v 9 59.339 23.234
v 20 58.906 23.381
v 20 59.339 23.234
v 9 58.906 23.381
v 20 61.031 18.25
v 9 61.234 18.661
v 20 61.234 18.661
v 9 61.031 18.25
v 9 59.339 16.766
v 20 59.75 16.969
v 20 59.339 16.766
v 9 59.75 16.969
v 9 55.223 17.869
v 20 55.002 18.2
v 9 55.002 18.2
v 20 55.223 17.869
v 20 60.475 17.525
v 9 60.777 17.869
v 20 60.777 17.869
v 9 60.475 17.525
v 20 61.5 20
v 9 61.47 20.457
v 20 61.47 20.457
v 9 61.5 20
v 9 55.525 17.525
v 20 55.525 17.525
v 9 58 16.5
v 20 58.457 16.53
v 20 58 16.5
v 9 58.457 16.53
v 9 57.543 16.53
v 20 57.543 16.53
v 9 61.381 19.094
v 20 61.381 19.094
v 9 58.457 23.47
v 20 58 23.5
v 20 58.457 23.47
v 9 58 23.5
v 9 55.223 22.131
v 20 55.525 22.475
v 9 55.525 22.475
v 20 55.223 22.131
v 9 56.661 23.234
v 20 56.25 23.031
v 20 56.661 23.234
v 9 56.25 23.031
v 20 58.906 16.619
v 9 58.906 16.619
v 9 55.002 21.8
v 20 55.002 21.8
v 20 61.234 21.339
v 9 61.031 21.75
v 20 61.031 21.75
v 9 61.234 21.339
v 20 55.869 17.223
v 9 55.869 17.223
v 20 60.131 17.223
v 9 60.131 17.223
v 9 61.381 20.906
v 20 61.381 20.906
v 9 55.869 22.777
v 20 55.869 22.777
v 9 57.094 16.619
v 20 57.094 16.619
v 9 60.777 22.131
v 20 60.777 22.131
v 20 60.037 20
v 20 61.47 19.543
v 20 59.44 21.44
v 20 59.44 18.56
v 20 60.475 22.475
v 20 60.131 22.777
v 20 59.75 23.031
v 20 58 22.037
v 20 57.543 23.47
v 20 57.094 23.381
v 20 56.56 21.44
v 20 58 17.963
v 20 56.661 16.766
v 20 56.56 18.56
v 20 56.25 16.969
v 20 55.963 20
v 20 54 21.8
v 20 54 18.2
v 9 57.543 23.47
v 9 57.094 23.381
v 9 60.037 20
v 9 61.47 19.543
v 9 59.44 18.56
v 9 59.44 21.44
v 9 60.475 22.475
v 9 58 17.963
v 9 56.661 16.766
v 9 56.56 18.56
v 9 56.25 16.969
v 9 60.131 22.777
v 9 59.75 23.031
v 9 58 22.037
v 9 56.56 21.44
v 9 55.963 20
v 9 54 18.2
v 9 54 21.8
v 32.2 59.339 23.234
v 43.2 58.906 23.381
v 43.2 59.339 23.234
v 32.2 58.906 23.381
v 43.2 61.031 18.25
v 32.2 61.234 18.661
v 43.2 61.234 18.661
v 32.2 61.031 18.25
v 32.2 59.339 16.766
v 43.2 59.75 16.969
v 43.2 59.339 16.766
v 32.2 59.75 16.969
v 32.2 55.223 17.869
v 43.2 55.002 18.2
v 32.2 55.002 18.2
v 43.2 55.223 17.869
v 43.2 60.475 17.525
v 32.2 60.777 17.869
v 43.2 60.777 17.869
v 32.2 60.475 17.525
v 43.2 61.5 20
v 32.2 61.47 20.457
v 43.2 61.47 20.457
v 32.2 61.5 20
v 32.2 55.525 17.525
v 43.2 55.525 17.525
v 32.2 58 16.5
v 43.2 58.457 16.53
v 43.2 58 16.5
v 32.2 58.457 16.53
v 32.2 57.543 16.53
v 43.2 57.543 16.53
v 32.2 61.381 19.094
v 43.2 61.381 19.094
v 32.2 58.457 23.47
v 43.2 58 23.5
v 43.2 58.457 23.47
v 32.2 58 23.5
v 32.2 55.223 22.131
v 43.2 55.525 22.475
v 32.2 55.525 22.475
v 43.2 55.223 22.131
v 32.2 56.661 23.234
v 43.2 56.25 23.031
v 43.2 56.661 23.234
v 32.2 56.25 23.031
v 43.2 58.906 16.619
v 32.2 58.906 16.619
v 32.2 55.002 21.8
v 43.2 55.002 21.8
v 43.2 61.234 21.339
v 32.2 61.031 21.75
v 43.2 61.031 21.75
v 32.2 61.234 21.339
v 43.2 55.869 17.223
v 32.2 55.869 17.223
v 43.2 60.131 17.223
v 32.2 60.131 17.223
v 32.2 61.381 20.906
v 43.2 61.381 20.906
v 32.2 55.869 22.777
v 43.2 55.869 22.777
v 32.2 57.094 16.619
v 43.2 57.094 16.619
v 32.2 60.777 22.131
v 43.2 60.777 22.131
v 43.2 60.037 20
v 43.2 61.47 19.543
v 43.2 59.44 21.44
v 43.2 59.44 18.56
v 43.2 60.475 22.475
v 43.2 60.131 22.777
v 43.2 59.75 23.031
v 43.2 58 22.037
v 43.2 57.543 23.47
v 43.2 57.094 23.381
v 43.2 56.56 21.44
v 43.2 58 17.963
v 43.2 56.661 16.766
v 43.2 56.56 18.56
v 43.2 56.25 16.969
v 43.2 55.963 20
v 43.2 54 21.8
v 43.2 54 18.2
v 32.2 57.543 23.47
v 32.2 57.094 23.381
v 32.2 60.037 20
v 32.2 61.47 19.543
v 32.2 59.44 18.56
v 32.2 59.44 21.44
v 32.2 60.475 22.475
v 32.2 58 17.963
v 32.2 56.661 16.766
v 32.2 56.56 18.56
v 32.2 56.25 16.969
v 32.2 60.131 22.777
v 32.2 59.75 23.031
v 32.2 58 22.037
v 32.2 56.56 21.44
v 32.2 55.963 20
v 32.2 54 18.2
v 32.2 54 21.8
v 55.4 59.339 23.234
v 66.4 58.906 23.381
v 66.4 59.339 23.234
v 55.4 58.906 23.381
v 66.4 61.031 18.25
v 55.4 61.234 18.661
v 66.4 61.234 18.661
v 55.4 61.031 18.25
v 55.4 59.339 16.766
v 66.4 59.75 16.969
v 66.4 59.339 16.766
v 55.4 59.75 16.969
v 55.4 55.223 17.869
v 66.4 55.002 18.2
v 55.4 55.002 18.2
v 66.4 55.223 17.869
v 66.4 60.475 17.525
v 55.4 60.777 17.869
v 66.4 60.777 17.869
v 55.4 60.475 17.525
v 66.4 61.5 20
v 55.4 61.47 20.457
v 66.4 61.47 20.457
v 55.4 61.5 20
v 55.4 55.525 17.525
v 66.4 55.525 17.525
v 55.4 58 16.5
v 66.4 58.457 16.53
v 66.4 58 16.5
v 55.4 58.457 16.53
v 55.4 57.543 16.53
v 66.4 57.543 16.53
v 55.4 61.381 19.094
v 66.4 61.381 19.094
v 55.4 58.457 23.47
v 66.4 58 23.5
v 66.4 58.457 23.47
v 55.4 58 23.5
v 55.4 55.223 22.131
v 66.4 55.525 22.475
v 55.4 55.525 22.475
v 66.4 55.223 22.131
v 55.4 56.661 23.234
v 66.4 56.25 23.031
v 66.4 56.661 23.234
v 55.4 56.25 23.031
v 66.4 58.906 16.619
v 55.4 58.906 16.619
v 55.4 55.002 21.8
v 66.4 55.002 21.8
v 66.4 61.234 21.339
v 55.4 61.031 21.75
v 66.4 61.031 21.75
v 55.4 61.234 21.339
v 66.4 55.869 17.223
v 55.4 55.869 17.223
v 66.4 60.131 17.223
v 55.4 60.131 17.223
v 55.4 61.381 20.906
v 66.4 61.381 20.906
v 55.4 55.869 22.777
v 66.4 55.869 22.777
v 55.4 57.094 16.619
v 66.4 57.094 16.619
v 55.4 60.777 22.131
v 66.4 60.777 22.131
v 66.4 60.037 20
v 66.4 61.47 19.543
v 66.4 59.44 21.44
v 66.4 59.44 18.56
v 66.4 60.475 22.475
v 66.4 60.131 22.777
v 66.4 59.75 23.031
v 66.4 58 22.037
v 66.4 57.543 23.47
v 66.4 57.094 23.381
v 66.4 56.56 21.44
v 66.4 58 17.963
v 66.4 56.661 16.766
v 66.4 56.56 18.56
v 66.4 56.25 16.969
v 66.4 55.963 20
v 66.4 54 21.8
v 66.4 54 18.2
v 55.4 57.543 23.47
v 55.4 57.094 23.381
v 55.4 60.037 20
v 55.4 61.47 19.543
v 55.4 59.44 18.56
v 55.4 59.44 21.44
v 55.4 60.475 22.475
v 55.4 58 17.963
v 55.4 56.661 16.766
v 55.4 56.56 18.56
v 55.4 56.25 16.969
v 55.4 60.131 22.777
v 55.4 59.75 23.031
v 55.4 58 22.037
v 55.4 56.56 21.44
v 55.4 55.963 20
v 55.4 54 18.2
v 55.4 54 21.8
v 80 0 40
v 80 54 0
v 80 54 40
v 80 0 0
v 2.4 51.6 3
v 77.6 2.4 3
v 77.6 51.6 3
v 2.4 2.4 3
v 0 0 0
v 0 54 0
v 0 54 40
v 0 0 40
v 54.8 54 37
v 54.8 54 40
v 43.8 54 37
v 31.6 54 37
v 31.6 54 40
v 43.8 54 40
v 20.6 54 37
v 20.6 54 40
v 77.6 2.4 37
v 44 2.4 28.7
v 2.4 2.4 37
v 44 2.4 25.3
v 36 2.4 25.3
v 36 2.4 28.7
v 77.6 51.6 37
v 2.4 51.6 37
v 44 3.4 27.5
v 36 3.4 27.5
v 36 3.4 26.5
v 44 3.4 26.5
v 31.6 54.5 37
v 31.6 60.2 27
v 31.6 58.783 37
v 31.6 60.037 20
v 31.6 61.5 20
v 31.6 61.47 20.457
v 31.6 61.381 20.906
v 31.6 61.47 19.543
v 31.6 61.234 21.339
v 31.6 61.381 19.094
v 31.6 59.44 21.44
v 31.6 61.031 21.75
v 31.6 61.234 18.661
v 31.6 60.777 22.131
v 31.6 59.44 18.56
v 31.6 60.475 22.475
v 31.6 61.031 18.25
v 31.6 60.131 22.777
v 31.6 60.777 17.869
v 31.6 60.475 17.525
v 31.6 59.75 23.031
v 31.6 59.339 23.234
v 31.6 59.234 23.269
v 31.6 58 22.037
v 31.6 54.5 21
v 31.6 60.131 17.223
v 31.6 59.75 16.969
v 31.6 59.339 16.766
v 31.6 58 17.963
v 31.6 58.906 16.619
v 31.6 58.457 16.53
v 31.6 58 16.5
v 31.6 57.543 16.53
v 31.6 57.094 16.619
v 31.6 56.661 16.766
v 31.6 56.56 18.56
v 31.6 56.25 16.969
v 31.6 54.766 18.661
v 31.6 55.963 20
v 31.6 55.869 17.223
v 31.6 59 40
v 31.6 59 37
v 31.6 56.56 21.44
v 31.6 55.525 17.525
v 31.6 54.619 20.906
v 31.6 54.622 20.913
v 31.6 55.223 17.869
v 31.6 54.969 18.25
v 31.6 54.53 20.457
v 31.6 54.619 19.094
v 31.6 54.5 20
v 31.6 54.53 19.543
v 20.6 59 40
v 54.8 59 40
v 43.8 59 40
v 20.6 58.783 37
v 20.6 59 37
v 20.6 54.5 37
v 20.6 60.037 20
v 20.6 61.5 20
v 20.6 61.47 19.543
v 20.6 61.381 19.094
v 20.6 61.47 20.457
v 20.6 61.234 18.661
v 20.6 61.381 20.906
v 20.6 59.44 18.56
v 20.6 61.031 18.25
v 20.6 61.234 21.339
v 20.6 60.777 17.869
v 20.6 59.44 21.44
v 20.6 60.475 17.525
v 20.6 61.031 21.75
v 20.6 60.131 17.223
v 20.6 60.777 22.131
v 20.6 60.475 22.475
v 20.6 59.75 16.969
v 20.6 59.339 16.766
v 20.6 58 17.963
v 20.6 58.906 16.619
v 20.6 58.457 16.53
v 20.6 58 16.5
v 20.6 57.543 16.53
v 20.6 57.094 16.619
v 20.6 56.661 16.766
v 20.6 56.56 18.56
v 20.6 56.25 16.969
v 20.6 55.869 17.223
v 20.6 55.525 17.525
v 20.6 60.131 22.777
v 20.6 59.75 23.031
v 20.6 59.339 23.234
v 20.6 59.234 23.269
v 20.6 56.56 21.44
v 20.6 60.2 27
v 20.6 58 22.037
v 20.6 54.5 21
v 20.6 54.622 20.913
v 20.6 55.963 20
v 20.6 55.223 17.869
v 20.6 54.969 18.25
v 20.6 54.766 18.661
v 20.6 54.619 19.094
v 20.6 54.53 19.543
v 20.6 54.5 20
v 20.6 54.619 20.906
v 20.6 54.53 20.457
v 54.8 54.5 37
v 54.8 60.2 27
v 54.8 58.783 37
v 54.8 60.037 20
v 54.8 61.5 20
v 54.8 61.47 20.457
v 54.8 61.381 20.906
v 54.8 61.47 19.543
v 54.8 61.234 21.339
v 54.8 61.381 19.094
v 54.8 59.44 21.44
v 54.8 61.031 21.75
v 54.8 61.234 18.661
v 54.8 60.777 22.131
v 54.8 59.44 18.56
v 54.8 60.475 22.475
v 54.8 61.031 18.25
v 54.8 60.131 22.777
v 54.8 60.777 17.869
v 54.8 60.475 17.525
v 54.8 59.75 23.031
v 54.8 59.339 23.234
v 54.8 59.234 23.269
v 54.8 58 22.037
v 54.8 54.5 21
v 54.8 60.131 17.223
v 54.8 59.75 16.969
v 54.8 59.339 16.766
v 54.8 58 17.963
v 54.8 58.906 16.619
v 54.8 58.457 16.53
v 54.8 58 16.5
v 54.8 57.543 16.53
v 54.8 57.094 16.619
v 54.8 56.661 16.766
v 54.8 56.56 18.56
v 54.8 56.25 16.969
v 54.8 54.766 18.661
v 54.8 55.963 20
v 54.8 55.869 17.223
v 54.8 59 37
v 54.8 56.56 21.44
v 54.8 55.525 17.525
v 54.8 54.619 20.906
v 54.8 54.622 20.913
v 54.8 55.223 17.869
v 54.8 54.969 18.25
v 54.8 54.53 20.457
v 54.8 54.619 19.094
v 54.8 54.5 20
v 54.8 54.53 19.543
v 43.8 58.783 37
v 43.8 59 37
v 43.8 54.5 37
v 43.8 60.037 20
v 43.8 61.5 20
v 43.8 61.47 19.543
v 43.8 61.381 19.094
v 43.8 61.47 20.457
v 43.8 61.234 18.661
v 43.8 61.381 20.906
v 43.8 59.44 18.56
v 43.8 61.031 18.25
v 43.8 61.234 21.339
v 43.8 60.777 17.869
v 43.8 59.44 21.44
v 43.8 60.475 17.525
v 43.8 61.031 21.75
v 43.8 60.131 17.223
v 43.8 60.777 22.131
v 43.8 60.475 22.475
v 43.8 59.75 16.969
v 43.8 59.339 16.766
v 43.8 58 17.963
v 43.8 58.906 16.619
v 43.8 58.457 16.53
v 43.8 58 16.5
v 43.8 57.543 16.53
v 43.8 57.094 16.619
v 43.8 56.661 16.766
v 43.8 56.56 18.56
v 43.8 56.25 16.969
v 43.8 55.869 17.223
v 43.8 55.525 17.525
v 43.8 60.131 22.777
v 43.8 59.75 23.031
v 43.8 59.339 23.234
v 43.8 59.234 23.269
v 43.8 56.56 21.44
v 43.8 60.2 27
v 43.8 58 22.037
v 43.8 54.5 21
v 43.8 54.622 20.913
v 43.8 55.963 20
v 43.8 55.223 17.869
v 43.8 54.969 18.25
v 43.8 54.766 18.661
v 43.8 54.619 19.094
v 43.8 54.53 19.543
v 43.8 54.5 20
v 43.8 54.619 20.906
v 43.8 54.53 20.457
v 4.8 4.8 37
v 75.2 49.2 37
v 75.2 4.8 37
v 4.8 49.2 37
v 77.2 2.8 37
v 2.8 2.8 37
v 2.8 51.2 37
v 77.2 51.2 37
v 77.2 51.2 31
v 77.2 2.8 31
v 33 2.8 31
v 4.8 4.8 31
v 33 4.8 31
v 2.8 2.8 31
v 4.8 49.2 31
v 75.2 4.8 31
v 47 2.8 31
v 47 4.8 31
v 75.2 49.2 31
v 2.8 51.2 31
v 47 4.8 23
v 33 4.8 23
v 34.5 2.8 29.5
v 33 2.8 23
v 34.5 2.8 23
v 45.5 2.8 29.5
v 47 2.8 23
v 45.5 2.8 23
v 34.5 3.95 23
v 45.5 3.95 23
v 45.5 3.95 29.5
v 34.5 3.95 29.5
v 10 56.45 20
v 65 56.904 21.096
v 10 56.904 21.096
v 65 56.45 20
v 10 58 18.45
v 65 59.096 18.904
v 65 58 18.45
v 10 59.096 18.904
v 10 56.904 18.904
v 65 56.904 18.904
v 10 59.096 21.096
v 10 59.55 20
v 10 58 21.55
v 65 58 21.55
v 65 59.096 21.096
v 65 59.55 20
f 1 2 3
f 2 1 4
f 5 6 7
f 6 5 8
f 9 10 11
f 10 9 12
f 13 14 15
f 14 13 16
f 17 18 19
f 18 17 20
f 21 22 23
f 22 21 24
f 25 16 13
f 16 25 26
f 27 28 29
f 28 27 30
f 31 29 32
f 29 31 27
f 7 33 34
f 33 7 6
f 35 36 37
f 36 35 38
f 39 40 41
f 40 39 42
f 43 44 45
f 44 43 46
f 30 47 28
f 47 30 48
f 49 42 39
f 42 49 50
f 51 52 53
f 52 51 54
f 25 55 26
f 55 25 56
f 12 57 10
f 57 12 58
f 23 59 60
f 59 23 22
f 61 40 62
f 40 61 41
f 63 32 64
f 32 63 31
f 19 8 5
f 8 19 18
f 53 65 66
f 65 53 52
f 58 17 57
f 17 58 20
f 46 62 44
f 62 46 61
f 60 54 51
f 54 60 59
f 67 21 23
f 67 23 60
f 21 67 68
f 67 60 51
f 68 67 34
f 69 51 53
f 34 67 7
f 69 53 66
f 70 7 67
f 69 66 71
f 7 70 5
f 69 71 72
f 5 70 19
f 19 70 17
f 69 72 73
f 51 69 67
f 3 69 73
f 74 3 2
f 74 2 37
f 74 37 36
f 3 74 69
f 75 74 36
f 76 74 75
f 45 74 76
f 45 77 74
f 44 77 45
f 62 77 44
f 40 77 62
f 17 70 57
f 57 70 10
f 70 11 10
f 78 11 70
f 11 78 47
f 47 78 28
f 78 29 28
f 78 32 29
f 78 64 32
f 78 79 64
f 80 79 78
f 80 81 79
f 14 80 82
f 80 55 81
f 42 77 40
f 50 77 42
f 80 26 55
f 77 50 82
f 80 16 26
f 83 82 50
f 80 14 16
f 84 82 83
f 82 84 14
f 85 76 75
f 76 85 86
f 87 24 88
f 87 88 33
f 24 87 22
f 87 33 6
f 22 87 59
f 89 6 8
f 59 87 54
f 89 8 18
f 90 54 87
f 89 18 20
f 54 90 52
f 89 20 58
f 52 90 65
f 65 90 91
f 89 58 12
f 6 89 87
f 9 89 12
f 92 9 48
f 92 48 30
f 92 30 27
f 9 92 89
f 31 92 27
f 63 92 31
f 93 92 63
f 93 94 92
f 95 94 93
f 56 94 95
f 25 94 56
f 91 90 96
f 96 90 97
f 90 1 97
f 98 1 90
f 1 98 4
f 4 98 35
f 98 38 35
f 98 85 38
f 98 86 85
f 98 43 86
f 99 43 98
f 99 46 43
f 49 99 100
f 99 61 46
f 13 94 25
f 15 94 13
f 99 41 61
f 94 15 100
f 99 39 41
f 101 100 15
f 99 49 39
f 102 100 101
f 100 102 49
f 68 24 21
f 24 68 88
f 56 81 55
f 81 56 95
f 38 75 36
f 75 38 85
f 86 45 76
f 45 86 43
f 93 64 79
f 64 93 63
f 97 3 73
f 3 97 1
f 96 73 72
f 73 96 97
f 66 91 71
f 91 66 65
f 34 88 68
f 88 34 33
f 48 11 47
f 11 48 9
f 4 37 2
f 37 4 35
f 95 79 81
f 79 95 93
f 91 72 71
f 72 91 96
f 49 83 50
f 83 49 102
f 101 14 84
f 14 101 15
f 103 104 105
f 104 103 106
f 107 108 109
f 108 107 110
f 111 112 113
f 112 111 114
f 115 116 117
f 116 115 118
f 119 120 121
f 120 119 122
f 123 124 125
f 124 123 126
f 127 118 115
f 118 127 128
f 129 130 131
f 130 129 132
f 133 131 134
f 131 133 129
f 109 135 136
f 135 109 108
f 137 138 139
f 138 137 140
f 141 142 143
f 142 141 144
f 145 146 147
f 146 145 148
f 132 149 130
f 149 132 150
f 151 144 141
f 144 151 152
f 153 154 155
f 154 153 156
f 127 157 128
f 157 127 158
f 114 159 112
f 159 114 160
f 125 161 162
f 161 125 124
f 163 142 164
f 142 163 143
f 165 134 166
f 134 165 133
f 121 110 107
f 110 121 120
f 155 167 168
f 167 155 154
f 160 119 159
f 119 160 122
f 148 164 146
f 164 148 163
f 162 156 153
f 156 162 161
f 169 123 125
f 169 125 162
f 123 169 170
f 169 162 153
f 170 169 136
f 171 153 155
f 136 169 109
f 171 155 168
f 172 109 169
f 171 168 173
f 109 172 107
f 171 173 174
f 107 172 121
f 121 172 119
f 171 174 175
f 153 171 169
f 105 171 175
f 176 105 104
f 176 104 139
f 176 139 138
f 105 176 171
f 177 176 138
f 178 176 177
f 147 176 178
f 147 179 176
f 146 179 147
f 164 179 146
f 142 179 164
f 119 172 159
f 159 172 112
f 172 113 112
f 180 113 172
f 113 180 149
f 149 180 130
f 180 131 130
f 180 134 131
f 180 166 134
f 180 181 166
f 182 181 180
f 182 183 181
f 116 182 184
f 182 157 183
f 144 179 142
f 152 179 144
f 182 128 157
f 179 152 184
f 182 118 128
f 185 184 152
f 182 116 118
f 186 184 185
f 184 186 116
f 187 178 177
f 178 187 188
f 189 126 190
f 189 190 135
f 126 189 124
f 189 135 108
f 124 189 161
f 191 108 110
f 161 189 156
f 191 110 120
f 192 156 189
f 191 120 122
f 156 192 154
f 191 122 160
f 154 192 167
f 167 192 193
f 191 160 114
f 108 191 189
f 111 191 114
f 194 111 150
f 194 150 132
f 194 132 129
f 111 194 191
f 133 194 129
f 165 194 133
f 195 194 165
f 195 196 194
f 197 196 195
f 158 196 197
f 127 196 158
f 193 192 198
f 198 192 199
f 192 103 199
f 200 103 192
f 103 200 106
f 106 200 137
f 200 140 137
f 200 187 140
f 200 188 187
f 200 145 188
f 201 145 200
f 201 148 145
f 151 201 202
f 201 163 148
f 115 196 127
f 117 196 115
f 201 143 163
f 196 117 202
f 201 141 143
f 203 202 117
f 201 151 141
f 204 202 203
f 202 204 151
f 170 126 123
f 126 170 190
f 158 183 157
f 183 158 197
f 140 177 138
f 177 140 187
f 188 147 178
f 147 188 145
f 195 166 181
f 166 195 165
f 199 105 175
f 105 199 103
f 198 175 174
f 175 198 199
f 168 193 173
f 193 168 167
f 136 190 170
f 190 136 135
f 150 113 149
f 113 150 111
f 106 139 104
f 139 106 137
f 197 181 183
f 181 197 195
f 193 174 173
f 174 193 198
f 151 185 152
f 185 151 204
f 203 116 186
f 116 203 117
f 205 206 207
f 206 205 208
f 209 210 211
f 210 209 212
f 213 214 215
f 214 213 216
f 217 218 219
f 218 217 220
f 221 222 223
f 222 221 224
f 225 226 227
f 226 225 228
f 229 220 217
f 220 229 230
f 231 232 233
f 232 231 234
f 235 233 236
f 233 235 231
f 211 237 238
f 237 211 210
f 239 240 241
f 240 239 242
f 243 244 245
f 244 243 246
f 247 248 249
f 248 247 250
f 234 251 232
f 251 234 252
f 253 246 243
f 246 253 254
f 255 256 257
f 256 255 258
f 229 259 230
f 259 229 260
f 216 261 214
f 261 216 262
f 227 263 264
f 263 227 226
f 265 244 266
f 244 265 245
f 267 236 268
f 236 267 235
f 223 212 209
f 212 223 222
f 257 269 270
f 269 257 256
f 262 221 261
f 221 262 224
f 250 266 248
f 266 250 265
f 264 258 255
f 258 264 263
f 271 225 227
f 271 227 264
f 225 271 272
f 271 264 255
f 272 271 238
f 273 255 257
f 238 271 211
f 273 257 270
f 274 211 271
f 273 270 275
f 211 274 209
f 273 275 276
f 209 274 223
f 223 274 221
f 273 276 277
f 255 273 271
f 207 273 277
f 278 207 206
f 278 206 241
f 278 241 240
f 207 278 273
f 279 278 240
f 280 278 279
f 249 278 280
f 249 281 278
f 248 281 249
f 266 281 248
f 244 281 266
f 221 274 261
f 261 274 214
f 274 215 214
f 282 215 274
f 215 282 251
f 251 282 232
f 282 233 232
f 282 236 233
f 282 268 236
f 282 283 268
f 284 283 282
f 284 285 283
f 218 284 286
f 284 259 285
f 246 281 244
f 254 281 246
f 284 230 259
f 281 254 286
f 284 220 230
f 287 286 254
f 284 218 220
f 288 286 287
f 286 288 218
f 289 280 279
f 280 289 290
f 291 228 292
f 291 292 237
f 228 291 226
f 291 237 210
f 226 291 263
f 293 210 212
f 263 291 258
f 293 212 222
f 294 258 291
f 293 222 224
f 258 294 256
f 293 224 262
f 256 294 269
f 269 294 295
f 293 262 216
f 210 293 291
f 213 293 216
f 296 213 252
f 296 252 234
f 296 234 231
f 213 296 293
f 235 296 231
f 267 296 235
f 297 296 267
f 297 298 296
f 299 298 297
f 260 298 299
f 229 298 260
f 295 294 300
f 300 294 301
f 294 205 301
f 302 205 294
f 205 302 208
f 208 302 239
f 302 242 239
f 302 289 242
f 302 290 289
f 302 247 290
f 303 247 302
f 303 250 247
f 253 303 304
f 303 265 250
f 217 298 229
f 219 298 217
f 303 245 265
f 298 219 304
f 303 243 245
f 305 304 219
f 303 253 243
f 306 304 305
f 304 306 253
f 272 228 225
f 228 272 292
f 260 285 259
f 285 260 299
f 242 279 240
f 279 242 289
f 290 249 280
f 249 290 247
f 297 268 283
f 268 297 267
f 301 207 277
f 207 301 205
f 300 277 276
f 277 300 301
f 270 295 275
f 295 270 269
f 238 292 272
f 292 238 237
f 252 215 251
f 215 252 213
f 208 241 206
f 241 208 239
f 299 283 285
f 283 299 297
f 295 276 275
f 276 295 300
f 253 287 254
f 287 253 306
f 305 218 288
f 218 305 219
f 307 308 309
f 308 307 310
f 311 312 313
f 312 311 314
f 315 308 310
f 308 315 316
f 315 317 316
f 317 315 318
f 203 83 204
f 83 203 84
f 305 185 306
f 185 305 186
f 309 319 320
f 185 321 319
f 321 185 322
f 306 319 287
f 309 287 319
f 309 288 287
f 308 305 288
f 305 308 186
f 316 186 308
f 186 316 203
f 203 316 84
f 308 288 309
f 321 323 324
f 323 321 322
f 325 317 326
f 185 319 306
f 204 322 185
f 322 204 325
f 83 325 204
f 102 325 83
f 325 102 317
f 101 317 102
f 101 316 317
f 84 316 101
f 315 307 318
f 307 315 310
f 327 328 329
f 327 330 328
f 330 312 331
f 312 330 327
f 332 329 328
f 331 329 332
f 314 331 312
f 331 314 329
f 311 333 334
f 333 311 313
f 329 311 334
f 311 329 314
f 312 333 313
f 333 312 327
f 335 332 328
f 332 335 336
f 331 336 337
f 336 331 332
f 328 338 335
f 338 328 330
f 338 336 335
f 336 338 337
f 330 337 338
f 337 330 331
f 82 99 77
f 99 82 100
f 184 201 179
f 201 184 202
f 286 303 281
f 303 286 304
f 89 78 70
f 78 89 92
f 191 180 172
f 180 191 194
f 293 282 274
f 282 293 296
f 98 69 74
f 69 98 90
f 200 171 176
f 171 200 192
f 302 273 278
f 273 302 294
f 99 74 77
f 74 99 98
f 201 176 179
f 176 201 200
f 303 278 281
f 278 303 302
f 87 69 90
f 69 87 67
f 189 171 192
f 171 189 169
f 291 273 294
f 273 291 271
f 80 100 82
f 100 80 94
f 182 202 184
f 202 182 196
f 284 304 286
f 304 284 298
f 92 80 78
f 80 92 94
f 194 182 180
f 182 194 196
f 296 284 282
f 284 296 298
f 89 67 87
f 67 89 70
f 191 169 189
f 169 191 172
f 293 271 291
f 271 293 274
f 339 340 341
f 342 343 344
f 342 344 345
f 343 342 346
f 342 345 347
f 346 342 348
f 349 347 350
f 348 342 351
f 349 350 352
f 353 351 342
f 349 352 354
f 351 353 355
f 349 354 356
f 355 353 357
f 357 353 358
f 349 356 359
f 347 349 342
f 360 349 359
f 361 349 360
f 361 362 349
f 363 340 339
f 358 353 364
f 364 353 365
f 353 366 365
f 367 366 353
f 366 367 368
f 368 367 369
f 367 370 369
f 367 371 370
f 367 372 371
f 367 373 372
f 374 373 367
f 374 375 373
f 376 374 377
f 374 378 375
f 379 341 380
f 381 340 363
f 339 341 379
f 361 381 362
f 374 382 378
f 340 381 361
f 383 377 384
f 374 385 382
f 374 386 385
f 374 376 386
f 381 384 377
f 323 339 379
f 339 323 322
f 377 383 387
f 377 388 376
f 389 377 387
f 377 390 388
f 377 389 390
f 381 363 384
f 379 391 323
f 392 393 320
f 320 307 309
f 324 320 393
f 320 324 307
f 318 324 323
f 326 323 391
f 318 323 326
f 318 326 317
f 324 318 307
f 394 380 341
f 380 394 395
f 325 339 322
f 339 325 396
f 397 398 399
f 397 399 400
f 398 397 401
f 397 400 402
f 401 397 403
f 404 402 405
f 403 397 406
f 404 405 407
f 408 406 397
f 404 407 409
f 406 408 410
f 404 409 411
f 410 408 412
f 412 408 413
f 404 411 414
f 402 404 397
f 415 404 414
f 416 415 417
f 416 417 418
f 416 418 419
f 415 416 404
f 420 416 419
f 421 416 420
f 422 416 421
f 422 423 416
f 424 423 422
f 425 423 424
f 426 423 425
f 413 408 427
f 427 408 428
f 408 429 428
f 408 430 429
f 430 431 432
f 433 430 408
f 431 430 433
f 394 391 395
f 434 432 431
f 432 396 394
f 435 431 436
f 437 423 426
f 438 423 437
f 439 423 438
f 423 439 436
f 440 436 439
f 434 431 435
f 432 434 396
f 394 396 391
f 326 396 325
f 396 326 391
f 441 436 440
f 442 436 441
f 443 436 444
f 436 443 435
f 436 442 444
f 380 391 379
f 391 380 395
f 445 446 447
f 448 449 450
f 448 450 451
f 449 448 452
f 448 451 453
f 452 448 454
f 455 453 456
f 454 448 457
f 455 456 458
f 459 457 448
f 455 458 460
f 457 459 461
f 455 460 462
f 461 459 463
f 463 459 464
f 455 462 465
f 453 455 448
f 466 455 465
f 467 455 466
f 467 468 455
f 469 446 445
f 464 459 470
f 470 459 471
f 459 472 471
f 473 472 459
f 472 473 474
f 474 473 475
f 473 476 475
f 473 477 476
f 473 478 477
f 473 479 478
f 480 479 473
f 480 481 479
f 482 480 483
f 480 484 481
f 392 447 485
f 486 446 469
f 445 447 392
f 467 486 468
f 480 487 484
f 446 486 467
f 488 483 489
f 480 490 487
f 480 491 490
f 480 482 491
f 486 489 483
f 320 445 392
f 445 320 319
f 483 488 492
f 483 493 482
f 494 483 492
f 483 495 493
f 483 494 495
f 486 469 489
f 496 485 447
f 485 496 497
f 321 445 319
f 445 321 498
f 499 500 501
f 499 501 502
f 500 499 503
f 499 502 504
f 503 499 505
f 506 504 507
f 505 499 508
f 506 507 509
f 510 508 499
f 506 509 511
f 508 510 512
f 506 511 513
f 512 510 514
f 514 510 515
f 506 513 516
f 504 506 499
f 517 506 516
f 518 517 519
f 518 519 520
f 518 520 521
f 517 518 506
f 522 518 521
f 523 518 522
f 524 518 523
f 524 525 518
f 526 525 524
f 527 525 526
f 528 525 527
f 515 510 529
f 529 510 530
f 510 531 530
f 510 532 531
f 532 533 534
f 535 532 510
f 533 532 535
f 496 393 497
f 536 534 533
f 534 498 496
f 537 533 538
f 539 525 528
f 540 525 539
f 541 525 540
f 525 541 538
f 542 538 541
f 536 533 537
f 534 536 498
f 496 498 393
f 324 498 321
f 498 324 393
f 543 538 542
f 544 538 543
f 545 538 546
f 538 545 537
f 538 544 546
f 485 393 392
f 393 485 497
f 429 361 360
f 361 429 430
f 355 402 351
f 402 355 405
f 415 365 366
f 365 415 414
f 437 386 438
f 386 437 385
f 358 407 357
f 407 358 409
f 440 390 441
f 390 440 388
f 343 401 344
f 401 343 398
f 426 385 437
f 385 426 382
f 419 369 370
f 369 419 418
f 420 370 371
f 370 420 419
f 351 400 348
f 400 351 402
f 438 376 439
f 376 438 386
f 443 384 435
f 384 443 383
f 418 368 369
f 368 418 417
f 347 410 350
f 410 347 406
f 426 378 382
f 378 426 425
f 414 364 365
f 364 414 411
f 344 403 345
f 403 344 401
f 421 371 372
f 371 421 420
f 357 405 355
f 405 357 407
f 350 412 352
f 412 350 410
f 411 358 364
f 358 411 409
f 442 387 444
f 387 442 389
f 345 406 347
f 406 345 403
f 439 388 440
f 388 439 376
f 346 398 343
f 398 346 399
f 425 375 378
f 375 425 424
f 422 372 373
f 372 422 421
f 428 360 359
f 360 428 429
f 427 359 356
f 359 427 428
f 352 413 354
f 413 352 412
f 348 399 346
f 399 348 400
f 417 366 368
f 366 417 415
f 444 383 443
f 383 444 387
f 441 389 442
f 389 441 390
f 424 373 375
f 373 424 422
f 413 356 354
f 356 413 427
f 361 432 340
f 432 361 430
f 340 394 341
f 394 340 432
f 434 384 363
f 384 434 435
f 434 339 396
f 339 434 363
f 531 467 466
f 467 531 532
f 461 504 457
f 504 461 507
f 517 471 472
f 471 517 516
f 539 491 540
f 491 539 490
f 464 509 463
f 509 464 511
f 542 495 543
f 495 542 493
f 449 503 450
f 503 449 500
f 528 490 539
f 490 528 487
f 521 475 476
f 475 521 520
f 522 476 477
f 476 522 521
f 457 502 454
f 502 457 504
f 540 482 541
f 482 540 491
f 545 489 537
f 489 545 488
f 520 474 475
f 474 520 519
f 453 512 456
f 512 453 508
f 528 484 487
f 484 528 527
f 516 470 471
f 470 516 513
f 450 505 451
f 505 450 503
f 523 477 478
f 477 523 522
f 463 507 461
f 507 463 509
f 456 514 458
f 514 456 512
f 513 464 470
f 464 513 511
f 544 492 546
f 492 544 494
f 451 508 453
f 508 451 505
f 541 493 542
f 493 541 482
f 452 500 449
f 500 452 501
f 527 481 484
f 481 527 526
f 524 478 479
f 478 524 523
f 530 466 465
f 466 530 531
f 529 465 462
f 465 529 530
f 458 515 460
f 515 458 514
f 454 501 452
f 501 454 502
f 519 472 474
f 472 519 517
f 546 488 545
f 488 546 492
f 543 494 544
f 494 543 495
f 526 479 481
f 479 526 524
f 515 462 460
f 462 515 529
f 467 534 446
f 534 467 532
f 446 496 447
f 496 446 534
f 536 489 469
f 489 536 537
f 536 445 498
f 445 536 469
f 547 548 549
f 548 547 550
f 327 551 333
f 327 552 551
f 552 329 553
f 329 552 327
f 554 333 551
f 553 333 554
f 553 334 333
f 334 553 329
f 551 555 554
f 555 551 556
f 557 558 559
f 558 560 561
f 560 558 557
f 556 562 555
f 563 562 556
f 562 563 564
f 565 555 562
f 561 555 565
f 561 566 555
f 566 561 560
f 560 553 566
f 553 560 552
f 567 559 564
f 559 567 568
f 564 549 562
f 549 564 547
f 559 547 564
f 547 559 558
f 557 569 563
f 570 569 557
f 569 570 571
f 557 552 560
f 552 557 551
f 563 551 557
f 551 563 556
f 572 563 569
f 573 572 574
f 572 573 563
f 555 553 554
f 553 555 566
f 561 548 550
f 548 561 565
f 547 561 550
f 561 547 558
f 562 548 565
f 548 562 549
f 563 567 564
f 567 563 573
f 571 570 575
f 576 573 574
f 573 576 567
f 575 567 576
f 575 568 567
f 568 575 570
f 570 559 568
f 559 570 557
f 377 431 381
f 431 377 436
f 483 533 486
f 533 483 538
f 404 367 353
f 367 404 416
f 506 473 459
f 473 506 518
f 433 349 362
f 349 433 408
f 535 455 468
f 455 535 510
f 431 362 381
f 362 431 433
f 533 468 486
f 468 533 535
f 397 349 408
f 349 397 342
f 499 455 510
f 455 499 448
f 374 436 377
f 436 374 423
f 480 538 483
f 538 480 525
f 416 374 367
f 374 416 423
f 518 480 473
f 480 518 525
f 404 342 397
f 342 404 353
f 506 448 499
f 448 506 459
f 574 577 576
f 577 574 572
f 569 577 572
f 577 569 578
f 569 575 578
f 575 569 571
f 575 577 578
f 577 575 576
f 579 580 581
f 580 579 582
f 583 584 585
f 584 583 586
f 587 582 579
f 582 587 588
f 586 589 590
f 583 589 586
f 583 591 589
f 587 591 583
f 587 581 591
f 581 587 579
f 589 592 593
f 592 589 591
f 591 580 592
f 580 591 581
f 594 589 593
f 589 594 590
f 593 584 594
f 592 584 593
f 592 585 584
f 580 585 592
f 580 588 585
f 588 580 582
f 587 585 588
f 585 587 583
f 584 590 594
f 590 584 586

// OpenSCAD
// Box with print-in-place hinge
// Closed body 80 (x) x 54 (y body, 61.5 incl. hinge) x 40 (z) mm.
// Lid occupies the top 10 mm. Hinge pin axis: y=58, z=20 (mid-height at the
// back), so swinging the lid -180 deg about that axis lays the lid flat on
// the bed behind the box: that is the print-in-place pose.
// Clearances (PLA, 0.4 nozzle): pin/bore 0.40 radial, knuckle axial gaps
// 0.6, lid lip to box walls 0.4, lid barrels to box back wall 0.5.

part = "assembly"; // [assembly, box, lid, pin]
cadverify_only = "";

W = 80; D = 54; H = 40; box_h = 30;
wall = 2.4; floor_t = 3; plate_t = 3;
hinge_y = 58; hinge_z = 20;
barrel_r = 3.5; bore_r = 2.0; pin_r = 1.55; cap_r = 2.9;
hinge_ymax = hinge_y + barrel_r;          // 61.5
box_segs  = [[9, 11], [32.2, 11], [55.4, 11]];   // [x0, len]
lid_segs  = [[20.6, 11], [43.8, 11]];
pin_x0 = 10; pin_len = 55;

module instance(name, partname, unit = 1) {
    echo(cadverify_instance = [name, partname, unit]);
    if (cadverify_only == "" || cadverify_only == name) children();
}

// Extrude a (y,z) profile along +x starting at x0, offset by (oy,oz).
module extrude_yz(profile, x0, len, oy = 0, oz = 0) {
    multmatrix([[0,0,1,x0],[1,0,0,oy],[0,1,0,oz],[0,0,0,1]])
        linear_extrude(height = len) polygon(points = profile);
}

module barrel(x0, len) {
    translate([x0, hinge_y, hinge_z]) rotate([0, 90, 0])
        cylinder(h = len, r = barrel_r, $fn = 48);
}

bore_fr = pin_r * cos(22.5) + 0.45;   // bore facet distance: uniform 0.45 gap around the pin
bore_oct_r = bore_fr / cos(22.5);
module bore_cut() {
    // octagonal bore, same diamond orientation as the pin: facet gap 0.45 everywhere
    extrude_yz(oct_pts(bore_oct_r, 0), 4, 72, hinge_y, hinge_z);
}

module box_closed() {
    difference() {
        union() {
            // floor and walls up to z=30
            translate([0, 0, 0]) cube([W, D, floor_t]);
            translate([0, 0, floor_t]) cube([W, wall, box_h - floor_t]);              // front
            translate([0, D - wall, floor_t]) cube([W, wall, box_h - floor_t]);       // back
            translate([0, wall, floor_t]) cube([wall, D - 2*wall, box_h - floor_t]);  // left
            translate([W - wall, wall, floor_t]) cube([wall, D - 2*wall, box_h - floor_t]); // right
            // front catch detent bump on the inner front wall (wedged ridge)
            extrude_yz([[2.4,25.3],[3.4,26.5],[3.4,27.5],[2.4,28.7]], 36, 8);
            // hinge knuckles + arms to the back wall
            for (s = box_segs) {
                barrel(s[0], s[1]);
                translate([s[0], 53.5, hinge_z - 1.8]) cube([s[1], 5, 3.6]);
            }
        }
        bore_cut();
    }
}

module lid_closed() {
    difference() {
        union() {
            // top plate + back hinge tabs
            translate([0, 0, H - plate_t]) cube([W, D, plate_t]);
            for (s = lid_segs) translate([s[0], 53, H - plate_t]) cube([s[1], 6, plate_t]);
            // external skirt (down to z=30, flush with box walls outside)
            translate([0, 0, box_h]) cube([W, wall, H - plate_t - box_h]);                  // front
            translate([0, D - wall, box_h]) cube([W, wall, H - plate_t - box_h]);           // back
            translate([0, wall, box_h]) cube([wall, D - 2*wall, H - plate_t - box_h]);      // left
            translate([W - wall, wall, box_h]) cube([wall, D - 2*wall, H - plate_t - box_h]); // right
            // inner sealing lip (0.4 clear of box inner walls)
            translate([2.8, 2.8, 31]) cube([74.4, 2, 6]);        // front lip
            translate([2.8, 49.2, 31]) cube([74.4, 2, 6]);       // back lip
            translate([2.8, 4.8, 31]) cube([2, 44.4, 6]);        // left lip
            translate([75.2, 4.8, 31]) cube([2, 44.4, 6]);       // right lip
            // central catch tongue on the front lip, reaching down to z=23
            translate([33, 2.8, 23]) cube([14, 2, 8]);
            // hinge knuckles + diagonal straps up to the plate tabs
            for (s = lid_segs) {
                barrel(s[0], s[1]);
                extrude_yz([[54.5,39],[58.5,39],[60.2,27],[58,18.5],[54.5,21]], s[0], s[1]);
            }
        }
        bore_cut();
        // catch notch in the tongue: open at the bottom, receives the box detent bump when shut
        translate([34.5, 2.7, 22.5]) cube([11, 1.25, 7]);
        // fingernail scoop in the front skirt bottom edge
        translate([40, -1, box_h]) rotate([90, 0, 0]) cylinder(h = 4, r = 4.5, $fn = 32);
    }
}

function oct_pts(r, off = 22.5) = [for (i = [0:7]) let (a = off + 45*i) [r*cos(a), r*sin(a)]];

module pin_closed() {
    // octagonal axle with a vertex up/down (45 deg facets, no flat ceiling),
    // ends protrude past the outer knuckles
    extrude_yz(oct_pts(pin_r, 0), pin_x0, pin_len, hinge_y, hinge_z);
}

// --- printed (as-exported) orientations ---
module lid_printed() {
    // closed lid rotated 180 deg about the hinge axis, then dropped to y=0
    translate([0, hinge_ymax, H]) rotate([180, 0, 0]) lid_closed();
}
pin_off = pin_r; // 1.55 half-height of the diamond-oriented shaft
module pin_printed() {
    translate([-pin_x0, -(hinge_y - pin_off), -(hinge_z - pin_off)]) pin_closed();
}

box_spec = [
    ["bounds", [[0, 0, 0], [W, hinge_ymax, box_h]]],
    ["bodies", 1],
    ["support_faces", [["bed", "-z", 4000]]],
    ["overhangs_allowed", [
        ["hinge barrels and arms: horizontal print-in-place axle housings, bore is self-supported inside the tube", [[8, 53, 16], [67.5, 62, 24]]]
    ]],
    ["copies", 1],
    ["details", [
        ["floor", "material", [[10, 10, 0.5], [70, 44, 2.5]], 0.98],
        ["interior", "void", [[6, 6, 8], [74, 48, 24]], 0.98],
        ["front_wall", "thickness", [40, -1, 15], [0, 1, 0], 2.4],
        ["knuckle_arm", "material", [[10, 53.8, 18.8], [19, 55.8, 21.2]], 0.9],
        ["hinge_bore", "void", [[10, 57.1, 19.1], [19, 58.9, 20.9]], 1.0],
        ["catch_bump", "material", [[37, 2.6, 26.6], [43, 3.3, 27.4]], 0.85],
        ["catch_bump_view", "view", [[35, 2, 24], [45, 4.5, 29.5]]],
        ["hinge_view", "view", [[8, 53, 15], [67, 62, 25]]]
    ]]
];

lid_spec = [
    ["bounds", [[0, 0, 0], [W, hinge_ymax, 23.5]]],
    ["bodies", 1],
    ["support_faces", [["bed", "-z", 4000]]],
    ["overhangs_allowed", [
        ["hinge barrels and straps: horizontal print-in-place axle housings", [[20, 0, 0], [55.5, 8, 24]]],
        ["catch groove underside in print pose", [[34, 56, 11], [46, 59, 15]]]
    ]],
    ["copies", 1],
    ["details", [
        ["top_plate", "material", [[10, 17.5, 0.5], [70, 51.5, 2.5]], 0.98],
        ["front_skirt", "material", [[10, 59.3, 4.5], [70, 61.3, 7.5]], 0.9],
        ["plate_thickness", "thickness", [40, 30, -1], [0, 0, 1], 3],
        ["tongue", "material", [[38, 57, 9.2], [42, 58.5, 10.3]], 0.85],
        ["catch_groove", "void", [[37, 57.7, 12], [43, 58.5, 14]], 1.0],
        ["hinge_bore", "void", [[23, 2.6, 19.1], [29, 4.4, 20.9]], 1.0],
        ["strap", "material", [[23, 3.5, 8], [29, 6.5, 12]], 0.8],
        ["catch_groove_view", "view", [[33, 56.5, 9], [47, 59, 17]]],
        ["lid_knuckle_view", "view", [[20, 0, 16], [32, 8, 24]]]
    ]]
];

pin_spec = [
    ["bounds", [[0, 0, 0], [pin_len, 2*pin_off, 2*pin_off]]],
    ["bodies", 1],
    ["overhangs_allowed", [
        ["45 degree lower facets of the diamond print-in-place axle, 0.45 above the bore", [[-0.1, -0.1, -0.1], [55.1, 3.2, 1.6]]]
    ]],
    ["copies", 1],
    ["details", [
        ["shaft", "material", [[10, 0.9, 0.9], [50, 2.2, 2.2]], 0.9],
        ["shaft_thickness", "thickness", [30, pin_off, -1], [0, 0, 1], 3.1],
        ["pin_end_view", "view", [[0, 0, 0], [3, 3.1, 3.1]]]
    ]]
];

assembly_spec = [
    ["bounds", [[0, 0, 0], [W, hinge_ymax, H]]],
    ["support_faces", [["table", "-z", 4000]]],
    ["motions", [
        ["lid_swing", ["lid"], "rotate", [0, hinge_y, hinge_z], [1, 0, 0], [-180, 0],
            ["flex", [["lid", "box", 1.0, "front catch tongue snaps 0.6 mm over the detent bump while closing"]]]]
    ]],
    ["assembly_order", [
        [["box"], [0, 0, 0]],
        [["lid"], [0, 0, -1], ["rotate", [0, hinge_y, hinge_z], [1, 0, 0], 180]],
        [["pin"], [1, 0, 0]]
    ]],
    ["print_in_place", 0.4],
    ["print_pose", [["lid_swing", -180]]],
    ["overhangs_allowed", [
        ["box hinge barrels in print pose", [[8, 53, 16], [67.5, 62, 24]]],
        ["lid hinge barrels and straps in print pose", [[20, 53, 0], [56, 62, 24]]],
        ["horizontal pin inside its bore, 0.4 above the bore surface", [[5, 55, 16.5], [70.5, 61, 20]]],
        ["lid catch groove in print pose", [[33, 110, 2], [47, 114, 18]]]
    ]]
];

if (part == "box") {
    echo(cadverify_spec = box_spec);
    box_closed();
} else if (part == "lid") {
    echo(cadverify_spec = lid_spec);
    lid_printed();
} else if (part == "pin") {
    echo(cadverify_spec = pin_spec);
    pin_printed();
} else {
    echo(cadverify_spec = assembly_spec);
    instance("box", "box") box_closed();
    instance("lid", "lid")
        translate([0, hinge_ymax, H]) rotate([180, 0, 0]) lid_printed();
    instance("pin", "pin")
        translate([pin_x0, hinge_y - pin_off, hinge_z - pin_off]) pin_printed();
}
